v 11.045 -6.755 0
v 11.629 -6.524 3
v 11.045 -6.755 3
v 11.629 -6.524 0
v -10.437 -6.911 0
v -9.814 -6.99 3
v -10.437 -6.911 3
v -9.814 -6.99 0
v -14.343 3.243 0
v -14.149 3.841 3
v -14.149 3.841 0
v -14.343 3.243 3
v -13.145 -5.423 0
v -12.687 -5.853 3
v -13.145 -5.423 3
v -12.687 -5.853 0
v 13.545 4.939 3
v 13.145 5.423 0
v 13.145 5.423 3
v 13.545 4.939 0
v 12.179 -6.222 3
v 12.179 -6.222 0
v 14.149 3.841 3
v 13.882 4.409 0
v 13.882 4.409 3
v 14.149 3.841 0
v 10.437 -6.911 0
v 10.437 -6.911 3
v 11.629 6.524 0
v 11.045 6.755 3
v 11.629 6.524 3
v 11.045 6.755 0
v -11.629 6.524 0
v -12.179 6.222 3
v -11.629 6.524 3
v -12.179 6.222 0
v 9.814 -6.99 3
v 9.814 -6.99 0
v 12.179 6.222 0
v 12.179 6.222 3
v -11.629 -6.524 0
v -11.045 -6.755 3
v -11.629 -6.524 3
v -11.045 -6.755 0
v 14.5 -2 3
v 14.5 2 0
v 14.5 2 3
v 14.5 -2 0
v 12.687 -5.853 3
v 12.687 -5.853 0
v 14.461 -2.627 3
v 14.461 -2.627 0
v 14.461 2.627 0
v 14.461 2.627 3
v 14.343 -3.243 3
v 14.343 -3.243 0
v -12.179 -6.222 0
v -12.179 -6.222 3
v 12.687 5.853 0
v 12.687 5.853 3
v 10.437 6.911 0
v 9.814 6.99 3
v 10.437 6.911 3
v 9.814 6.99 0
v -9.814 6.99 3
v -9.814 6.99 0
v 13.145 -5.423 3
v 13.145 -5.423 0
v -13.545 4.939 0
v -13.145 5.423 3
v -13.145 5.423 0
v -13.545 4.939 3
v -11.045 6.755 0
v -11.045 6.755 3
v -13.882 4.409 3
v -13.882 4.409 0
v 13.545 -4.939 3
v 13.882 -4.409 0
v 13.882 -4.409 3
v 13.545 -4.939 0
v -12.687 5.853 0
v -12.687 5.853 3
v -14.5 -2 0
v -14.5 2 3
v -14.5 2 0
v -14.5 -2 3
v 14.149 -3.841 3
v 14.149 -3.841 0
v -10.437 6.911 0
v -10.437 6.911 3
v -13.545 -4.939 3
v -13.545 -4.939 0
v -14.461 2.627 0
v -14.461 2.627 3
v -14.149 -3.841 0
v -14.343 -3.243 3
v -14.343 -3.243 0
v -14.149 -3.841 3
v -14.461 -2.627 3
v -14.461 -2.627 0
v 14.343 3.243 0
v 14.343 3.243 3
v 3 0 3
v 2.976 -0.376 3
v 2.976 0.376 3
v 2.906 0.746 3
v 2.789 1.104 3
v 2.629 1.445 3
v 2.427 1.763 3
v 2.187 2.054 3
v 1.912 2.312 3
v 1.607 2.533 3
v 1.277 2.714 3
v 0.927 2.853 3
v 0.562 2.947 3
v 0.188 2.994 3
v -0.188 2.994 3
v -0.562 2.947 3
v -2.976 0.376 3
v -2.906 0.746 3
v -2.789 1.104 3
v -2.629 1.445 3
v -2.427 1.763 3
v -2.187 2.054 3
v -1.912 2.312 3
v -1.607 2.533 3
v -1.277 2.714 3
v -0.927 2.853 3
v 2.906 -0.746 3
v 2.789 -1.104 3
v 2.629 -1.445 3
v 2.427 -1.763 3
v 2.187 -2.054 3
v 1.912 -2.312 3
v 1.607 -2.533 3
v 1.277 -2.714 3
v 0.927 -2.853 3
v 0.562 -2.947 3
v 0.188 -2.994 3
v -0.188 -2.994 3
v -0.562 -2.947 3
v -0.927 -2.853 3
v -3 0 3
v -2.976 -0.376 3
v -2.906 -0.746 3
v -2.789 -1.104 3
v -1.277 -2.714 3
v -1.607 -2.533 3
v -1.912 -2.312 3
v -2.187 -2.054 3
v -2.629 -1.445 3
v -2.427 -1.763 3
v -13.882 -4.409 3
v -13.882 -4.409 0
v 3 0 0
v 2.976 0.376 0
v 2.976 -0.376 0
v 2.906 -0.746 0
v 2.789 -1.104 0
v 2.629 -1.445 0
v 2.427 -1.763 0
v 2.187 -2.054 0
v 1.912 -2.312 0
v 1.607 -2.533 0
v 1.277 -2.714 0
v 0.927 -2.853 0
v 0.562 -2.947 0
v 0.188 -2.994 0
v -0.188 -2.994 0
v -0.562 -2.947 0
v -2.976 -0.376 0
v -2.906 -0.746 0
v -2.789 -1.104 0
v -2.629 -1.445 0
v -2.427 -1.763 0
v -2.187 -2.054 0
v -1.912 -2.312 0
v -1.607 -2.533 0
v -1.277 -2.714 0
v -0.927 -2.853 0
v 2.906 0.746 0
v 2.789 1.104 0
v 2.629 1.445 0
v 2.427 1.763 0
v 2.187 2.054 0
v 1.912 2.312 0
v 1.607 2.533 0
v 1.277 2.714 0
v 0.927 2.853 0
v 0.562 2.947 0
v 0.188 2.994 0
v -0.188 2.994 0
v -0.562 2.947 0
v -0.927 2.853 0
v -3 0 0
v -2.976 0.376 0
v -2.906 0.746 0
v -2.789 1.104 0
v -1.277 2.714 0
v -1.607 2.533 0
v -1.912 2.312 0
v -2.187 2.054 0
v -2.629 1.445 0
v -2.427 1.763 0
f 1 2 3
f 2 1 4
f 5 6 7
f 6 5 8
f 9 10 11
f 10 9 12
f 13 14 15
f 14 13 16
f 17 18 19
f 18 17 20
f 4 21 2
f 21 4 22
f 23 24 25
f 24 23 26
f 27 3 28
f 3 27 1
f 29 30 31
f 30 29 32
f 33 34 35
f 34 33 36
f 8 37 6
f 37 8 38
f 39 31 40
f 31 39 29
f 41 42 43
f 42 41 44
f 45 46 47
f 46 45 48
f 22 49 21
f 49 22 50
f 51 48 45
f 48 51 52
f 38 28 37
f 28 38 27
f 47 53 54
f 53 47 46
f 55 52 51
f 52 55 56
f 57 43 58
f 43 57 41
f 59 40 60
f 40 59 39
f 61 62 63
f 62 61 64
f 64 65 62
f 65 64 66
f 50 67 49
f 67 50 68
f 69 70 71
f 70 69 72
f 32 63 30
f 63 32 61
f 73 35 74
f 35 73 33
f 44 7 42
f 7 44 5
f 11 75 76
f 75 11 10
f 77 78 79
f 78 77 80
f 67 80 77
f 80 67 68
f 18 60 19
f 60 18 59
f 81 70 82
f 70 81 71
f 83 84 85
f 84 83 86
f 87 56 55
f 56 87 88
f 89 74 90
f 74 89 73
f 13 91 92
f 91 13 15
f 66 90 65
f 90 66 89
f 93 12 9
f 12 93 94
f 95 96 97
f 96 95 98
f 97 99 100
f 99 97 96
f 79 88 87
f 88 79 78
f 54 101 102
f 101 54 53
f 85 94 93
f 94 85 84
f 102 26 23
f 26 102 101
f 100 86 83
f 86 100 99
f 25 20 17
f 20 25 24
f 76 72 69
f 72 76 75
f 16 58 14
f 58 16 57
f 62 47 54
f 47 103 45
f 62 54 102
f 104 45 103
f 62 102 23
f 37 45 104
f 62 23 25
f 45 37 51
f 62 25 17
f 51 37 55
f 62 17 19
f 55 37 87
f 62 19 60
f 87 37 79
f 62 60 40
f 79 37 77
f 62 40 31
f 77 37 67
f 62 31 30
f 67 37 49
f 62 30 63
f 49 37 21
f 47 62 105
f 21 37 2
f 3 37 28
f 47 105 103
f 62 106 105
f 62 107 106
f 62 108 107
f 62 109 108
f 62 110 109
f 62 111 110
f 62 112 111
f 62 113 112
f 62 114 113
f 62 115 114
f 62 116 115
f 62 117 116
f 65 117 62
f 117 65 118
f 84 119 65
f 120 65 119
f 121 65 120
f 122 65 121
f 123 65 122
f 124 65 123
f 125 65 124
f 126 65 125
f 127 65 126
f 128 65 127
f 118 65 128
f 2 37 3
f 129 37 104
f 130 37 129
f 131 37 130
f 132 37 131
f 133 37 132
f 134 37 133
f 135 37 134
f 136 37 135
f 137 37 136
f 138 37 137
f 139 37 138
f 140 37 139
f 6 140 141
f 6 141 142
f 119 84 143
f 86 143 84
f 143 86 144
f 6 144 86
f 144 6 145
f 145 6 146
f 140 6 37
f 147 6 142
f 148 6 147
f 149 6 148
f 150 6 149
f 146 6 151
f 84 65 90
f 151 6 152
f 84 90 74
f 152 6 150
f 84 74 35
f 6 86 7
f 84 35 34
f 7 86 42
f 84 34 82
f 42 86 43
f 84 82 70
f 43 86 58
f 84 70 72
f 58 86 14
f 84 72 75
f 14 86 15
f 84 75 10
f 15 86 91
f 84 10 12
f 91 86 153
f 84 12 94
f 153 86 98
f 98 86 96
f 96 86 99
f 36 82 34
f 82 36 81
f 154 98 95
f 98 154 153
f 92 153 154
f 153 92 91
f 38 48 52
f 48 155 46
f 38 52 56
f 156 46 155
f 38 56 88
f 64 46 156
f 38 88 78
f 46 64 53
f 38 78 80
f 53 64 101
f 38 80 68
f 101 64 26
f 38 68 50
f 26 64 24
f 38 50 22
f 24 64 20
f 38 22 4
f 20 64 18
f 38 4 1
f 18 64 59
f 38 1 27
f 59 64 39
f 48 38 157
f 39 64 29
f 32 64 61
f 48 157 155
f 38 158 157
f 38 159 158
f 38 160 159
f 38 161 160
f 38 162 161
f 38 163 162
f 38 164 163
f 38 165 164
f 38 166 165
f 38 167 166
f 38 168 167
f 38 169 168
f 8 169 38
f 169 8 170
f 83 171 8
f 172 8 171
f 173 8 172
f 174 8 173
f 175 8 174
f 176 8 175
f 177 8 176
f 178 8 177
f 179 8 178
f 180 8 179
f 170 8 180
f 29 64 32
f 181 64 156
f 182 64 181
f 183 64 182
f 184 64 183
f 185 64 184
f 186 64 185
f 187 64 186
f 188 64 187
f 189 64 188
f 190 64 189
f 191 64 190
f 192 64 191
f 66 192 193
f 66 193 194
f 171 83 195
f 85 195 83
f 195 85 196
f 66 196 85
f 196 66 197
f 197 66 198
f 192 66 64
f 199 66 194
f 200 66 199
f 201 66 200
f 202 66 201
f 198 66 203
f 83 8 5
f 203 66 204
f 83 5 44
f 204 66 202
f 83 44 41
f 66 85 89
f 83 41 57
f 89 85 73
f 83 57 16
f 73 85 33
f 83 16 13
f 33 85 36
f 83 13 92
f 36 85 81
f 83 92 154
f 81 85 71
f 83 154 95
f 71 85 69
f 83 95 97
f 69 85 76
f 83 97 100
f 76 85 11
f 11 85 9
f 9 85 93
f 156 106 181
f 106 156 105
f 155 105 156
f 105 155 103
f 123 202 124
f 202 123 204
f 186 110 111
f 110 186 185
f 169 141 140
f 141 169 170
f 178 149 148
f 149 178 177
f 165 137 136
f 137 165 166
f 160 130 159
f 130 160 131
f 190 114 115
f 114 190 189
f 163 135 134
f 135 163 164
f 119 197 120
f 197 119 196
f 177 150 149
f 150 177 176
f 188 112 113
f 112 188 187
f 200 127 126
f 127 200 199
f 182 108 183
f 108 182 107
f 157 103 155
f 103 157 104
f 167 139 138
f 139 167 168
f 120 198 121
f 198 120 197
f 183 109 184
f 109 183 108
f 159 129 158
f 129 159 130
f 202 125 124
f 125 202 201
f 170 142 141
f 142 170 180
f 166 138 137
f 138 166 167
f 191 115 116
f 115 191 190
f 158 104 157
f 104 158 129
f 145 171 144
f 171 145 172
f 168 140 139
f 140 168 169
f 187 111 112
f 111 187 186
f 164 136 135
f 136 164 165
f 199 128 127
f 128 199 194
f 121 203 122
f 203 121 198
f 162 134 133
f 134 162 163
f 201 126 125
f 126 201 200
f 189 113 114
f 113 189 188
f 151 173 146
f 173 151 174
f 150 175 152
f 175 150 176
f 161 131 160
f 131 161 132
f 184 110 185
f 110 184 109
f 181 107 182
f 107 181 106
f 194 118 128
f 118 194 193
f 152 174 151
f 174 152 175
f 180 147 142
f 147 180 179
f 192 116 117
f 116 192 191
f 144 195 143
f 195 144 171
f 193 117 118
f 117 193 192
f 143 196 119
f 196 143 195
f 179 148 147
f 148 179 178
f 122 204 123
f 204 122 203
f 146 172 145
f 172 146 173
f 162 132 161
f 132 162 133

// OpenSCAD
$fn = 50;

difference() {
	union() {
		hull() {
			translate(v = [-9.5, 2.0, 0]) {
				cylinder(h = 3, r = 5);
			}
			translate(v = [9.5, 2.0, 0]) {
				cylinder(h = 3, r = 5);
			}
			translate(v = [-9.5, -2.0, 0]) {
				cylinder(h = 3, r = 5);
			}
			translate(v = [9.5, -2.0, 0]) {
				cylinder(h = 3, r = 5);
			}
		}
	}
	union() {
		cylinder(h = 3, r = 3.0);
	}
}
